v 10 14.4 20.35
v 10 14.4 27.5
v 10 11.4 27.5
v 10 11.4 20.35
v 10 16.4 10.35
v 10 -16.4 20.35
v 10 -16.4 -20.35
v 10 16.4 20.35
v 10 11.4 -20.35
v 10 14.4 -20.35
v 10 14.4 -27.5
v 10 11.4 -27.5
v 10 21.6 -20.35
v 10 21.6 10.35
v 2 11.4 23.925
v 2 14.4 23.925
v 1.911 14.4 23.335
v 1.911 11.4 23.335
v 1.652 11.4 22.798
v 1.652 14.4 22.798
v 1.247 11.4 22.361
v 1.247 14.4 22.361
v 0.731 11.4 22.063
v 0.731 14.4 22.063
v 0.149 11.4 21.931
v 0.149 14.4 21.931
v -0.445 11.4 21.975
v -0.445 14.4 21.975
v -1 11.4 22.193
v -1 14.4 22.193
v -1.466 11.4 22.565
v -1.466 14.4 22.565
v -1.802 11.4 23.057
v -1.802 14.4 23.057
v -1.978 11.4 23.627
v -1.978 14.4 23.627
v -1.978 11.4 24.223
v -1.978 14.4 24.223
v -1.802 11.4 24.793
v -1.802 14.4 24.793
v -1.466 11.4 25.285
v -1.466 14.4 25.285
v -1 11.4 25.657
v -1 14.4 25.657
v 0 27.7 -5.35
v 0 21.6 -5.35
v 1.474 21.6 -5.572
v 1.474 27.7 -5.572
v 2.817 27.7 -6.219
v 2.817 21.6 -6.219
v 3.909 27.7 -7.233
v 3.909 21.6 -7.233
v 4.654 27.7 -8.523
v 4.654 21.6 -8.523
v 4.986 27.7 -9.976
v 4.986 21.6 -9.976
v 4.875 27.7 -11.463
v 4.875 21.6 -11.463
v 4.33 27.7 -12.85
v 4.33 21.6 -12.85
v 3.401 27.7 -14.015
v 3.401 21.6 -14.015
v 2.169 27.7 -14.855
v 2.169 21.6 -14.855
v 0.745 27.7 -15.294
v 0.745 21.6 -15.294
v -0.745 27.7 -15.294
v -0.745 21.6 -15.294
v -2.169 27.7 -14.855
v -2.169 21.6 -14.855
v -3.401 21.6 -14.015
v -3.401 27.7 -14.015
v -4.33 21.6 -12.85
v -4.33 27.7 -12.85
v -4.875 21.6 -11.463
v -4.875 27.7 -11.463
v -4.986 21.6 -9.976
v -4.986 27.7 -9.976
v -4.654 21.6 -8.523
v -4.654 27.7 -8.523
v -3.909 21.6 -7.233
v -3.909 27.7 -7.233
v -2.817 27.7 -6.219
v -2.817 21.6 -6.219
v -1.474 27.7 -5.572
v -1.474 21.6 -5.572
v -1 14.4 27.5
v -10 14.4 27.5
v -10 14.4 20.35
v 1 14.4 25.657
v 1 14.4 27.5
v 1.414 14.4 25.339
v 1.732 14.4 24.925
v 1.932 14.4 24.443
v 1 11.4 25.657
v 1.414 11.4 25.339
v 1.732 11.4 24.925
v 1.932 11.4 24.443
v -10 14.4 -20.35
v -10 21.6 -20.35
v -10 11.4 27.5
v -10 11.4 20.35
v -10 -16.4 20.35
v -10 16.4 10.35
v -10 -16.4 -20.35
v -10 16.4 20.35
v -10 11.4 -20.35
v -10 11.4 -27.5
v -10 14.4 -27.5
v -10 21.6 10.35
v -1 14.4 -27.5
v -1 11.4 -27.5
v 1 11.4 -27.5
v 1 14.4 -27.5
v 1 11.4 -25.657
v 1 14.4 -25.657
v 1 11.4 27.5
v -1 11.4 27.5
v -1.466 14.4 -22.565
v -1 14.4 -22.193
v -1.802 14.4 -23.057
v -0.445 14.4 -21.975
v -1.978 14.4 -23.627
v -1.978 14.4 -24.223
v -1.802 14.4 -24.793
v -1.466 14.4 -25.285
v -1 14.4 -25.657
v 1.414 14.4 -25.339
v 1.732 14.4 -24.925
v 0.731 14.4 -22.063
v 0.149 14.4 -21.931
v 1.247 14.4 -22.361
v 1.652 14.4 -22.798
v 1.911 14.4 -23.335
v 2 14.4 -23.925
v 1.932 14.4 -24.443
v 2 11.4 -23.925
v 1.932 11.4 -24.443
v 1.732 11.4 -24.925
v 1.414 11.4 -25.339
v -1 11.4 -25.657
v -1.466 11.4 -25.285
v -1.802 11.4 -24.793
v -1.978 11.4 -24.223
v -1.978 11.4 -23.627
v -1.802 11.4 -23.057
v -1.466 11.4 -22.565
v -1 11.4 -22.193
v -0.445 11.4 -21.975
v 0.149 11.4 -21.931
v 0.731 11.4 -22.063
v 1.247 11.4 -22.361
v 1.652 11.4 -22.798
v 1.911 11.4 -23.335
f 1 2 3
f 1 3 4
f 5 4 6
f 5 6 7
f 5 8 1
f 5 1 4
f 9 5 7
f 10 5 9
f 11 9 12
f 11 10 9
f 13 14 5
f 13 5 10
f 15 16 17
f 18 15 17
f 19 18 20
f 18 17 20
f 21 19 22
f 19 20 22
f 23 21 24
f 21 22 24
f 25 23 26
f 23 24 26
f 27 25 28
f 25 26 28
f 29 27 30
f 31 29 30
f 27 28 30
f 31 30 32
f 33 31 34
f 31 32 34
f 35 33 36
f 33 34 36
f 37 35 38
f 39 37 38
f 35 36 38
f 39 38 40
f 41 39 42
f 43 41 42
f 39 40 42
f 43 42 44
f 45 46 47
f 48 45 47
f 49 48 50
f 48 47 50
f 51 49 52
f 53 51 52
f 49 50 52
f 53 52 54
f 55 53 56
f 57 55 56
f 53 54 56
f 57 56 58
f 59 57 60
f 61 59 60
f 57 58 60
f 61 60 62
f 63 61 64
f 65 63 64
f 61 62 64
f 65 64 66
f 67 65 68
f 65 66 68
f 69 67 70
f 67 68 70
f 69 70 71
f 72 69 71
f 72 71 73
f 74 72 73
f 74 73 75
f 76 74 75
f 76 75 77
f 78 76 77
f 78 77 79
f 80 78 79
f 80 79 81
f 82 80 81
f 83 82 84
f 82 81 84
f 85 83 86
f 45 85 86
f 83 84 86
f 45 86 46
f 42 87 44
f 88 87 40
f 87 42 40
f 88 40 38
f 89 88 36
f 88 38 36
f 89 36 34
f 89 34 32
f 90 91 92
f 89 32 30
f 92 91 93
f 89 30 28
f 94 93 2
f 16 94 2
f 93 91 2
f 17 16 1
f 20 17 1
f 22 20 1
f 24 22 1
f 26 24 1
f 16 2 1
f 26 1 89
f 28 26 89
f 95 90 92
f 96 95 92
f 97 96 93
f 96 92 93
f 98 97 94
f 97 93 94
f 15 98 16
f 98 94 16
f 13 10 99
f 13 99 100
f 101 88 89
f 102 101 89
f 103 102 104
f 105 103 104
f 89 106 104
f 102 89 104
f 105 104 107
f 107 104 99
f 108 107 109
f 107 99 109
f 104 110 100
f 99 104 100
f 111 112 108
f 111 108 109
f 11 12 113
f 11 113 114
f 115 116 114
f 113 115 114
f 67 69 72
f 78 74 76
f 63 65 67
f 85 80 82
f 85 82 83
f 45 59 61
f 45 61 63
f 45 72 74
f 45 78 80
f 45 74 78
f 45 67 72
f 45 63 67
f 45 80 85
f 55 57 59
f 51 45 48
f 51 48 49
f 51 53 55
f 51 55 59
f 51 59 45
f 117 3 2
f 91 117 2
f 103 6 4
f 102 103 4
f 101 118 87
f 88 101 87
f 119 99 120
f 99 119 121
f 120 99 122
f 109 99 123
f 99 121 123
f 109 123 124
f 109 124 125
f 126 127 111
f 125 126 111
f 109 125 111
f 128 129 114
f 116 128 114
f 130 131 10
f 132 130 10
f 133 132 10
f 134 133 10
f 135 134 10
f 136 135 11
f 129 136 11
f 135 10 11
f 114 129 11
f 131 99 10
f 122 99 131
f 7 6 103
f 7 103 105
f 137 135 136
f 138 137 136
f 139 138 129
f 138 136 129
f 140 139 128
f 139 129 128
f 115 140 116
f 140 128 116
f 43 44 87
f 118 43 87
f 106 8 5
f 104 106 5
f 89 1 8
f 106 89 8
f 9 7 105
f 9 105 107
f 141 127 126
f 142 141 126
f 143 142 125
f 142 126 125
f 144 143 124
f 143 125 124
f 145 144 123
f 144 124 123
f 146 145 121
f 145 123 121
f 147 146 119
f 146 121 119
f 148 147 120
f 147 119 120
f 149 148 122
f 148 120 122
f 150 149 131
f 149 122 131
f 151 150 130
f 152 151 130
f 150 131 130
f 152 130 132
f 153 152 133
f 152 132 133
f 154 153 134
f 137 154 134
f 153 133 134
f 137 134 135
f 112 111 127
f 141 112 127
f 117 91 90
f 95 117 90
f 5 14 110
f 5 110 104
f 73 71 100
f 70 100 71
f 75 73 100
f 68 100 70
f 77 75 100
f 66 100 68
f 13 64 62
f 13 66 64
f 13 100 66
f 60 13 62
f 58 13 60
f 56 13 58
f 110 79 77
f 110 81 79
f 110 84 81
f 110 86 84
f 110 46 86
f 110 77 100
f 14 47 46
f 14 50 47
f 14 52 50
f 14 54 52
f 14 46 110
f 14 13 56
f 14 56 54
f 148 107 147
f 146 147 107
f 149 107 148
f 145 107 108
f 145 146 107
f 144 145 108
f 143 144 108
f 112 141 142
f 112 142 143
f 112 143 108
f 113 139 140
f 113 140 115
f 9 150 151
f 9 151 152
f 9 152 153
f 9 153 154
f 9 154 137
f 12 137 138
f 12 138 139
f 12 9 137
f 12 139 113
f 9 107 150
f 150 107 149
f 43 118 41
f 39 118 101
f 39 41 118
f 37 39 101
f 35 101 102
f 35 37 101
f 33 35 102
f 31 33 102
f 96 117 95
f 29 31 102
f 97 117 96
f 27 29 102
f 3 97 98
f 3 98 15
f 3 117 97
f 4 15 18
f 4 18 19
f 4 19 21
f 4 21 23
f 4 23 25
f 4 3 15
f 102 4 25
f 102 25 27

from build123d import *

# Parameters (mm, degrees)
SKETCH2_W           = 40.7
SKETCH2_H           = 32.8
SKETCH2_W_2         = 7.15
SKETCH2_H_2         = 3
BOSS_EXTRUDE1_DEPTH = 10
SKETCH3_R           = 5
BOSS_EXTRUDE2_DEPTH = 6.1
CUT_EXTRUDE1_DEPTH  = 43.483996987


with BuildPart() as part:
    # Sketch2 → Boss-Extrude1 (new, symmetric)
    with BuildSketch(Plane(origin=(0, 0, 0), x_dir=(0, 0, -1), z_dir=(1, 0, 0))):
        Rectangle(SKETCH2_W, SKETCH2_H)
        with Locations((-23.925, 12.9)):
            Rectangle(SKETCH2_W_2, SKETCH2_H_2)
        with Locations((23.925, 12.9)):
            Rectangle(SKETCH2_W_2, SKETCH2_H_2)
        Polygon((-10.35, 16.4), (20.35, 16.4), (20.35, 21.6), (15.35, 21.6), (5.35, 21.6), (-10.35, 21.6), align=None)
    extrude(amount=BOSS_EXTRUDE1_DEPTH, both=True)

    # Sketch3 → Boss-Extrude2 (add)
    with BuildSketch(Plane(origin=(0, 21.6, 0), x_dir=(1, 0, 0), z_dir=(0, 1, 0))):
        with Locations(Location((0, 10.35, 0), (0, 0, 270))):
            Circle(SKETCH3_R)
    extrude(amount=BOSS_EXTRUDE2_DEPTH)

    # Sketch4 → Cut-Extrude1 (cut, through all)
    with BuildSketch(Plane(origin=(0, 14.4, 0), x_dir=(1, 0, 0), z_dir=(0, 1, 0))):
        with BuildLine():
            Line((-1, -25.657050808), (-1, -27.5))
            Line((-1, -27.5), (1, -27.5))
            Line((1, -27.5), (1, -25.657050808))
            ThreePointArc((1, -25.657050808), (0, -25.925), (-1, -25.657050808))
        make_face()
        with BuildLine():
            ThreePointArc((2, -23.925), (-1, -22.192949192), (-1, -25.657050808))
            Line((-1, -25.657050808), (1, -25.657050808))
            ThreePointArc((1, -25.657050808), (1.732050808, -24.925), (2, -23.925))
        make_face()
        with BuildLine():
            Line((1, -25.657050808), (-1, -25.657050808))
            ThreePointArc((-1, -25.657050808), (0, -25.925), (1, -25.657050808))
        make_face()
        with BuildLine():
            ThreePointArc((2, 23.925), (1.732050808, 24.925), (1, 25.657050808))
            Line((1, 25.657050808), (-1, 25.657050808))
            ThreePointArc((-1, 25.657050808), (-1, 22.192949192), (2, 23.925))
        make_face()
        with BuildLine():
            Line((-1, 25.657050808), (1, 25.657050808))
            ThreePointArc((1, 25.657050808), (0, 25.925), (-1, 25.657050808))
        make_face()
        with BuildLine():
            Line((1, 25.657050808), (1, 27.5))
            Line((1, 27.5), (-1, 27.5))
            Line((-1, 27.5), (-1, 25.657050808))
            ThreePointArc((-1, 25.657050808), (0, 25.925), (1, 25.657050808))
        make_face()
    extrude(amount=-CUT_EXTRUDE1_DEPTH, mode=Mode.SUBTRACT)


solid = part.part
